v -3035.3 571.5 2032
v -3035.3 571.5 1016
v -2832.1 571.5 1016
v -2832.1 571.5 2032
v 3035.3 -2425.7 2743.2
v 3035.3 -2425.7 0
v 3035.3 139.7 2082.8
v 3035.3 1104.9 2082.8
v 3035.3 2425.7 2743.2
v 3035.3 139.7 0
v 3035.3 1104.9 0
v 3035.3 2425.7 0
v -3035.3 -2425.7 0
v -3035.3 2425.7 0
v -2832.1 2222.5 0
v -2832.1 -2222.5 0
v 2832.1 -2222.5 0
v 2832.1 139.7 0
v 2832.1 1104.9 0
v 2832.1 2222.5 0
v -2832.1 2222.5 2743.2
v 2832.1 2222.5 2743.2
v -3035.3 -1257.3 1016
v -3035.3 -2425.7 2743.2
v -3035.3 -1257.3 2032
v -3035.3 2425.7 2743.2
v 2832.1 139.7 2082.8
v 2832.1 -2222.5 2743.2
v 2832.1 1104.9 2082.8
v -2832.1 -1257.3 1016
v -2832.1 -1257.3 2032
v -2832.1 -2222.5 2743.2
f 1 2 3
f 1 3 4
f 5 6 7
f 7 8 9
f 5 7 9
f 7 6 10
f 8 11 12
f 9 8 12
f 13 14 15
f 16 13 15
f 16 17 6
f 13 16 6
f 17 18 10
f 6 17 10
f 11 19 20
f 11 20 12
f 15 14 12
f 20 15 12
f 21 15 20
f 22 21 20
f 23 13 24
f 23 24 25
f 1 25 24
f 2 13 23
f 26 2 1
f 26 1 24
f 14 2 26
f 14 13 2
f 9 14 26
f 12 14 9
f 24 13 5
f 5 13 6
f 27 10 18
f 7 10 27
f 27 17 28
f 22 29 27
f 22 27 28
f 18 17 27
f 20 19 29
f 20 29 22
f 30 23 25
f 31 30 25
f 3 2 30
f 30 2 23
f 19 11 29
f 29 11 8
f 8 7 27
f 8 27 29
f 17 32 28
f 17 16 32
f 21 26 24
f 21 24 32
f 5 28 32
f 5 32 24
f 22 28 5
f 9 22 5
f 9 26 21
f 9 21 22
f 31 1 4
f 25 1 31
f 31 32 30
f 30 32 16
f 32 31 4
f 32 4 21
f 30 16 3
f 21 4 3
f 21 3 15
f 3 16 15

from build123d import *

# Parameters (mm, degrees)
F0_W     = 6070.6
F0_H     = 4851.4
F0_W_2   = 5664.2
F0_H_2   = 4445
F1_DEPTH = 2438.4
F2_W     = 1828.8
F2_H     = 1016
F3_DEPTH = 254
F4_W     = 965.2
F4_H     = 2082.8
F5_DEPTH = 254
F6_DEPTH = 304.8


with BuildPart() as f1:
    # F0 (on Top) → F1 (new body)
    with BuildSketch(Plane.XY):
        Rectangle(F0_W, F0_H)
        Rectangle(F0_W_2, F0_H_2, mode=Mode.SUBTRACT)
    extrude(amount=F1_DEPTH)

    # F2 (on face) → F3 (cut)
    with BuildSketch(Plane(origin=(-3035.3, 0, 0), x_dir=(0, -1, 0), z_dir=(-1, 0, 0))):
        with Locations((342.9, 1524)):
            Rectangle(F2_W, F2_H)
    extrude(amount=-F3_DEPTH, mode=Mode.SUBTRACT)

    # F4 (on face) → F5 (cut)
    with BuildSketch(Plane.YZ.offset(3035.3)):
        with Locations((622.3, 1041.4)):
            Rectangle(F4_W, F4_H)
    extrude(amount=-F5_DEPTH, mode=Mode.SUBTRACT)

    # F6 (add): a face of the model
    f6_faces = [f1.faces().sort_by_distance(p)[0] for p in [
        (2957.5901123923, 0, 2438.4),
    ]]
    extrude(f6_faces, amount=F6_DEPTH)


solid = f1.part
